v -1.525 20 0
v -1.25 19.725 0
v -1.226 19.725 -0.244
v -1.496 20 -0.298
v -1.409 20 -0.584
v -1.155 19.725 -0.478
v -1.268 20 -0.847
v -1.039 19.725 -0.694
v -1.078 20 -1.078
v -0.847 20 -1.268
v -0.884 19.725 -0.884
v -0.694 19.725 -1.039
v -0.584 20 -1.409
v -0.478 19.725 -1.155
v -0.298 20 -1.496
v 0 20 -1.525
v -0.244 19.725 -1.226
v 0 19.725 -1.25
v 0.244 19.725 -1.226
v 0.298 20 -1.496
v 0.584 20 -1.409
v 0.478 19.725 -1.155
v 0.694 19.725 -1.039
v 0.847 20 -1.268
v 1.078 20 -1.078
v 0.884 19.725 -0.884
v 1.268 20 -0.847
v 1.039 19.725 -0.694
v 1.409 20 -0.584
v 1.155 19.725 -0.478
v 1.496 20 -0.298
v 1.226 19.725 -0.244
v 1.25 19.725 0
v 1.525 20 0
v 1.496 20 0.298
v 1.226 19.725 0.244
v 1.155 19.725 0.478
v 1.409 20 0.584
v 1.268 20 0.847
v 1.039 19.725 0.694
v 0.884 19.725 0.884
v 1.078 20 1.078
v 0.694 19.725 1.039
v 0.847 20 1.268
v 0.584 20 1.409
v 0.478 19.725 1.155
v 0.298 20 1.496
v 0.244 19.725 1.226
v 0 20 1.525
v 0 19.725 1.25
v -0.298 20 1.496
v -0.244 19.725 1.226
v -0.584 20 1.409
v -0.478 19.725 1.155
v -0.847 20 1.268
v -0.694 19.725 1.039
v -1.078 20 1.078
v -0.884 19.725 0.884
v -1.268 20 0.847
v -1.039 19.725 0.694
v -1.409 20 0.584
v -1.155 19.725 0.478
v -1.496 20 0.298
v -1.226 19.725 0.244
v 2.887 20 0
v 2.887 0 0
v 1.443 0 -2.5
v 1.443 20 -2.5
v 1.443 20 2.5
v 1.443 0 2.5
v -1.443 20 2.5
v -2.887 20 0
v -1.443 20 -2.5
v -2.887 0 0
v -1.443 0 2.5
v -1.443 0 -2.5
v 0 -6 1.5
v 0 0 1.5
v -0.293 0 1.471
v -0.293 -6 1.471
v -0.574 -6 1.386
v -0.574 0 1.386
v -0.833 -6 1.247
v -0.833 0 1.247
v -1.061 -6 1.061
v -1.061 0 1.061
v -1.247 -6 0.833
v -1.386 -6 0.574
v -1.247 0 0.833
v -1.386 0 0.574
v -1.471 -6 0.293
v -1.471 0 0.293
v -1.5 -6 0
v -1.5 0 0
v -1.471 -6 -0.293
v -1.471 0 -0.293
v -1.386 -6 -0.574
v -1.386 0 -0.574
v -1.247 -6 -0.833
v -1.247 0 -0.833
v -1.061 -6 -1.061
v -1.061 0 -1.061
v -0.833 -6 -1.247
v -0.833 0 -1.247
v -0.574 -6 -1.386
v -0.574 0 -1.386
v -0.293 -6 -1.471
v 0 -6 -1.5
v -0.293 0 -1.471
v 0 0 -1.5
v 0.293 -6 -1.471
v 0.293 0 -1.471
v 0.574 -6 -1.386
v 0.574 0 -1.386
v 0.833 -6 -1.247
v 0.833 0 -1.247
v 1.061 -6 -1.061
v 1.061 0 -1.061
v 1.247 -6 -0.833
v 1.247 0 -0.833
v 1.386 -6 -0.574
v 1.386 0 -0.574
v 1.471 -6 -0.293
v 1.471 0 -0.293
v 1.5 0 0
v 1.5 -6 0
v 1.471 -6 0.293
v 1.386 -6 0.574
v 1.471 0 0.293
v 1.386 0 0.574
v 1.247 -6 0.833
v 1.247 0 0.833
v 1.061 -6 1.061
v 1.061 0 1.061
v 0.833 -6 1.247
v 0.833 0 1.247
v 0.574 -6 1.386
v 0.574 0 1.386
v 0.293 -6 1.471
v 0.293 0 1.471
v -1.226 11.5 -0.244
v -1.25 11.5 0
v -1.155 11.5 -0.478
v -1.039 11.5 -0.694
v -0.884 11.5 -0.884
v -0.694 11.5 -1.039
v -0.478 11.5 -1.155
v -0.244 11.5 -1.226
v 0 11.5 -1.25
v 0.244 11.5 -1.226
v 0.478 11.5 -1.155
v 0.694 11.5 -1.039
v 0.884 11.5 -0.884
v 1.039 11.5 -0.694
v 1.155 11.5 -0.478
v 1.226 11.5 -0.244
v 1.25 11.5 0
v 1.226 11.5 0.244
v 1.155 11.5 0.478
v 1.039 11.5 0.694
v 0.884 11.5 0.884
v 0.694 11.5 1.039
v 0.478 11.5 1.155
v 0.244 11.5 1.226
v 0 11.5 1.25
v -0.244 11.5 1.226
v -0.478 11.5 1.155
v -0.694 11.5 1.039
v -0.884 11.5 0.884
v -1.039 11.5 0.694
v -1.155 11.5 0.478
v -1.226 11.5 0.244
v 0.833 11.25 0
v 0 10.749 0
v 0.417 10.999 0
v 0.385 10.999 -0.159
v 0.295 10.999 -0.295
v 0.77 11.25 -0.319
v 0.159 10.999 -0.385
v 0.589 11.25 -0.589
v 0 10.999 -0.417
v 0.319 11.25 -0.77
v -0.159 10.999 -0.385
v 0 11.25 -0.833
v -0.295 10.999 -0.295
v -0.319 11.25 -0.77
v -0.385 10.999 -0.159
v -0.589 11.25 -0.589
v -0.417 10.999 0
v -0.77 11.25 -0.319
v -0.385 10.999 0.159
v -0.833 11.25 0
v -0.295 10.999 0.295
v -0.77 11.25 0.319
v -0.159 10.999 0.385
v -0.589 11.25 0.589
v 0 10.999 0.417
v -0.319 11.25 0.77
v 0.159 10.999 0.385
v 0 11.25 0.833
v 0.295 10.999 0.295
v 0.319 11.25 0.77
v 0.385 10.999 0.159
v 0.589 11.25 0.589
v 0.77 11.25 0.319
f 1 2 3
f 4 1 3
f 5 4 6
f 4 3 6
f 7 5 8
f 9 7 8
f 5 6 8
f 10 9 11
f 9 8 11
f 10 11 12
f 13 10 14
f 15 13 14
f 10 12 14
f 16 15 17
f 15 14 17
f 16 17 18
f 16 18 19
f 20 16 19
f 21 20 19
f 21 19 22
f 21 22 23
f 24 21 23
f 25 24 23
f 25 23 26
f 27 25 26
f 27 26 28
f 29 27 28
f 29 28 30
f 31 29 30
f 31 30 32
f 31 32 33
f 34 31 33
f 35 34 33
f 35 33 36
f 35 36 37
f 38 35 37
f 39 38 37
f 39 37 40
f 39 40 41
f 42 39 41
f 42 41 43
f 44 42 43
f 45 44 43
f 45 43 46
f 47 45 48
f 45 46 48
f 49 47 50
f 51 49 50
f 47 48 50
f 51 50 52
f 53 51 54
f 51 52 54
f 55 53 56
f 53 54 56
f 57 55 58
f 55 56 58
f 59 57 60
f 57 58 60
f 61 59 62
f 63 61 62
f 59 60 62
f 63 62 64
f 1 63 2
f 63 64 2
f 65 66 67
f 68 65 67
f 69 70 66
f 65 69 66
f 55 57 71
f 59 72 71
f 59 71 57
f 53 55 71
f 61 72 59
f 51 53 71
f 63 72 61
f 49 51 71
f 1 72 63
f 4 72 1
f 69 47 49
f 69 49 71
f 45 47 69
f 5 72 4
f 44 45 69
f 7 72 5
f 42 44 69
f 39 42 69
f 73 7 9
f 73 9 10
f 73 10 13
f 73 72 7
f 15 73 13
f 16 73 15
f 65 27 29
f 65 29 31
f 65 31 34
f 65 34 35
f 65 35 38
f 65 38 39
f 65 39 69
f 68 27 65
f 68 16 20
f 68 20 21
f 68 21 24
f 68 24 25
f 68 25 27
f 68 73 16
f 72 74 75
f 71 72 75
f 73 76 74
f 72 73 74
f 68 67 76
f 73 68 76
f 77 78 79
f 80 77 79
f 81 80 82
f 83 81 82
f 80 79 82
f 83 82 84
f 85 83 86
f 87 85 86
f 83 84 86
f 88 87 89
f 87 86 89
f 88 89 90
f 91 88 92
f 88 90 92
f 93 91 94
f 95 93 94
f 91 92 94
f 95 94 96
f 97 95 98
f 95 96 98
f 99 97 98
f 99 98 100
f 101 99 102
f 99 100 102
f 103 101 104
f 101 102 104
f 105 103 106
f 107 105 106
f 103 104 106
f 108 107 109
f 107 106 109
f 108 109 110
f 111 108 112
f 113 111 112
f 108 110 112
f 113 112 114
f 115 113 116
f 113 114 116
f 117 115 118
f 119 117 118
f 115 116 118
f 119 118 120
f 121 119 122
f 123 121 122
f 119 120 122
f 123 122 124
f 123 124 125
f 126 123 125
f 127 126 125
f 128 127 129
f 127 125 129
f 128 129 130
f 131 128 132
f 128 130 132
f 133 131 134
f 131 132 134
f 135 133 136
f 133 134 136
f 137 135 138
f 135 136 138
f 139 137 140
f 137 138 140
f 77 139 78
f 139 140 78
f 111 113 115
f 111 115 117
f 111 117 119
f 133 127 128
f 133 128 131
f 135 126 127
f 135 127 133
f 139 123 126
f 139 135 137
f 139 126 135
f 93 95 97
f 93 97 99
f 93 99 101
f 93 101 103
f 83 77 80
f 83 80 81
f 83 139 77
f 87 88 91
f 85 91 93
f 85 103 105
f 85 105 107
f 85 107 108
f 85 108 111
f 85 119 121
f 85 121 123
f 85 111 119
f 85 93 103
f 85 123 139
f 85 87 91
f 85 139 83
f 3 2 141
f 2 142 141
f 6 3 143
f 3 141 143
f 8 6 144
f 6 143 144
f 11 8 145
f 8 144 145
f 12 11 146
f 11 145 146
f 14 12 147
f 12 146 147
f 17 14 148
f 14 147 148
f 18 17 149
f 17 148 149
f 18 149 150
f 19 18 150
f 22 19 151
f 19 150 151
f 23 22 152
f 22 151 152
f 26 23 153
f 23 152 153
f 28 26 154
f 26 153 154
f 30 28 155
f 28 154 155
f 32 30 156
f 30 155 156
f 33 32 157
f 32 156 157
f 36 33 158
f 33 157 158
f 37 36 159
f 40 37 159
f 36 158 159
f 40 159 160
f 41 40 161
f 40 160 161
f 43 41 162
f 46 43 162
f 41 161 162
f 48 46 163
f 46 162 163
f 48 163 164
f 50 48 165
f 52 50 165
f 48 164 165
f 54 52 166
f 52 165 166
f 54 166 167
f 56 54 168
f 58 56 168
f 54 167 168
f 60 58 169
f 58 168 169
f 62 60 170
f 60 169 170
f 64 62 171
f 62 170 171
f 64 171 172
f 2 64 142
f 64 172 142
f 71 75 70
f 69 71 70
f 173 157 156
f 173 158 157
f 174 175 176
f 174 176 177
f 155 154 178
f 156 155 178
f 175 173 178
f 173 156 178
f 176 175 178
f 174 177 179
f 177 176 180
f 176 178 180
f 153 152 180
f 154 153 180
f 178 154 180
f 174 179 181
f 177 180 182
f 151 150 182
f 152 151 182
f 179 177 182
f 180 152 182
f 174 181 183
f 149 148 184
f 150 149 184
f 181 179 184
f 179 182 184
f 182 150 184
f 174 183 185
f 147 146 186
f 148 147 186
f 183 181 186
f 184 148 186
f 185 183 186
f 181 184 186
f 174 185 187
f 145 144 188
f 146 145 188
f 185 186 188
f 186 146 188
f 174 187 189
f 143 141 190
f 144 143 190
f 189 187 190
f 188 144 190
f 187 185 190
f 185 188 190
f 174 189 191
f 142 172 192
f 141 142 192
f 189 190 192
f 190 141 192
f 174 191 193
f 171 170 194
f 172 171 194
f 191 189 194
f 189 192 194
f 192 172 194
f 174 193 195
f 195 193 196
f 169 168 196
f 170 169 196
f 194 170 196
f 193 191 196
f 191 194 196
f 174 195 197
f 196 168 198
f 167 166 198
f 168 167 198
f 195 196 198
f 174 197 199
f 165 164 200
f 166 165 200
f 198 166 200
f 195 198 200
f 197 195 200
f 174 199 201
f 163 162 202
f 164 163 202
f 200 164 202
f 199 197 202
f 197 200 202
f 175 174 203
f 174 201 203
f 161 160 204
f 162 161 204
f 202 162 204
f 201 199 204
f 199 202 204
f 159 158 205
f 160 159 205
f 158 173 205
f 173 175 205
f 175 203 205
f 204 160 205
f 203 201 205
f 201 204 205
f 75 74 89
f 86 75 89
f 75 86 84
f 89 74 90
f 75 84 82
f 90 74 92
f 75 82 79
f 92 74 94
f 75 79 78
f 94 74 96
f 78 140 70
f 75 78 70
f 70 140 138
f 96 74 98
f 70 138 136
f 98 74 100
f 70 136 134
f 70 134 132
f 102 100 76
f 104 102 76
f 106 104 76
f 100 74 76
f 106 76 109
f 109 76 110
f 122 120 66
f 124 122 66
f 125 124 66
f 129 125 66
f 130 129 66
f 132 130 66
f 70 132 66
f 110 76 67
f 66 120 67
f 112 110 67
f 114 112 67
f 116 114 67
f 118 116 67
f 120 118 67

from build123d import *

# Parameters (mm, degrees)
BOSS_EXTRUDE1_DEPTH             = 20
M3X0_5_TAPPED_HOLE1_D           = 2.5
M3X0_5_TAPPED_HOLE1_DEPTH       = 8.5
M3X0_5_TAPPED_HOLE1_CSINK_D     = 3.05
M3X0_5_TAPPED_HOLE1_CSINK_ANGLE = 90
M3X0_5_TAPPED_HOLE1_TIP         = 0.751075774
SKETCH4_R                       = 1.5
BOSS_EXTRUDE2_DEPTH             = 6


with BuildPart() as part:
    # Sketch1 → Boss-Extrude1 (new body)
    with BuildSketch(Plane(origin=(0, 0, 0), x_dir=(1, 0, 0), z_dir=(0, 1, 0))):
        Polygon((2.886751346, 0), (1.443375673, 2.5), (-1.443375673, 2.5), (-2.886751346, 0), (-1.443375673, -2.5), (1.443375673, -2.5), align=None)
    extrude(amount=BOSS_EXTRUDE1_DEPTH)

    # M3x0.5 Tapped Hole1
    with Locations(Plane(origin=(0, 20, 0), x_dir=(1, 0, 0), z_dir=(0, 1, 0))):
        with Locations((0, 0)):
            CounterSinkHole(M3X0_5_TAPPED_HOLE1_D / 2, M3X0_5_TAPPED_HOLE1_CSINK_D / 2, depth=M3X0_5_TAPPED_HOLE1_DEPTH, counter_sink_angle=M3X0_5_TAPPED_HOLE1_CSINK_ANGLE)
            with Locations((0, 0, -(M3X0_5_TAPPED_HOLE1_DEPTH + M3X0_5_TAPPED_HOLE1_TIP / 2))):  # 118° drill point
                Cone(0, M3X0_5_TAPPED_HOLE1_D / 2, M3X0_5_TAPPED_HOLE1_TIP, mode=Mode.SUBTRACT)

    # Sketch4 → Boss-Extrude2 (add)
    with BuildSketch(Plane.XZ):
        with Locations(Location((0, 0, 0), (0, 0, 90))):
            Circle(SKETCH4_R)
    extrude(amount=BOSS_EXTRUDE2_DEPTH)


solid = part.part
